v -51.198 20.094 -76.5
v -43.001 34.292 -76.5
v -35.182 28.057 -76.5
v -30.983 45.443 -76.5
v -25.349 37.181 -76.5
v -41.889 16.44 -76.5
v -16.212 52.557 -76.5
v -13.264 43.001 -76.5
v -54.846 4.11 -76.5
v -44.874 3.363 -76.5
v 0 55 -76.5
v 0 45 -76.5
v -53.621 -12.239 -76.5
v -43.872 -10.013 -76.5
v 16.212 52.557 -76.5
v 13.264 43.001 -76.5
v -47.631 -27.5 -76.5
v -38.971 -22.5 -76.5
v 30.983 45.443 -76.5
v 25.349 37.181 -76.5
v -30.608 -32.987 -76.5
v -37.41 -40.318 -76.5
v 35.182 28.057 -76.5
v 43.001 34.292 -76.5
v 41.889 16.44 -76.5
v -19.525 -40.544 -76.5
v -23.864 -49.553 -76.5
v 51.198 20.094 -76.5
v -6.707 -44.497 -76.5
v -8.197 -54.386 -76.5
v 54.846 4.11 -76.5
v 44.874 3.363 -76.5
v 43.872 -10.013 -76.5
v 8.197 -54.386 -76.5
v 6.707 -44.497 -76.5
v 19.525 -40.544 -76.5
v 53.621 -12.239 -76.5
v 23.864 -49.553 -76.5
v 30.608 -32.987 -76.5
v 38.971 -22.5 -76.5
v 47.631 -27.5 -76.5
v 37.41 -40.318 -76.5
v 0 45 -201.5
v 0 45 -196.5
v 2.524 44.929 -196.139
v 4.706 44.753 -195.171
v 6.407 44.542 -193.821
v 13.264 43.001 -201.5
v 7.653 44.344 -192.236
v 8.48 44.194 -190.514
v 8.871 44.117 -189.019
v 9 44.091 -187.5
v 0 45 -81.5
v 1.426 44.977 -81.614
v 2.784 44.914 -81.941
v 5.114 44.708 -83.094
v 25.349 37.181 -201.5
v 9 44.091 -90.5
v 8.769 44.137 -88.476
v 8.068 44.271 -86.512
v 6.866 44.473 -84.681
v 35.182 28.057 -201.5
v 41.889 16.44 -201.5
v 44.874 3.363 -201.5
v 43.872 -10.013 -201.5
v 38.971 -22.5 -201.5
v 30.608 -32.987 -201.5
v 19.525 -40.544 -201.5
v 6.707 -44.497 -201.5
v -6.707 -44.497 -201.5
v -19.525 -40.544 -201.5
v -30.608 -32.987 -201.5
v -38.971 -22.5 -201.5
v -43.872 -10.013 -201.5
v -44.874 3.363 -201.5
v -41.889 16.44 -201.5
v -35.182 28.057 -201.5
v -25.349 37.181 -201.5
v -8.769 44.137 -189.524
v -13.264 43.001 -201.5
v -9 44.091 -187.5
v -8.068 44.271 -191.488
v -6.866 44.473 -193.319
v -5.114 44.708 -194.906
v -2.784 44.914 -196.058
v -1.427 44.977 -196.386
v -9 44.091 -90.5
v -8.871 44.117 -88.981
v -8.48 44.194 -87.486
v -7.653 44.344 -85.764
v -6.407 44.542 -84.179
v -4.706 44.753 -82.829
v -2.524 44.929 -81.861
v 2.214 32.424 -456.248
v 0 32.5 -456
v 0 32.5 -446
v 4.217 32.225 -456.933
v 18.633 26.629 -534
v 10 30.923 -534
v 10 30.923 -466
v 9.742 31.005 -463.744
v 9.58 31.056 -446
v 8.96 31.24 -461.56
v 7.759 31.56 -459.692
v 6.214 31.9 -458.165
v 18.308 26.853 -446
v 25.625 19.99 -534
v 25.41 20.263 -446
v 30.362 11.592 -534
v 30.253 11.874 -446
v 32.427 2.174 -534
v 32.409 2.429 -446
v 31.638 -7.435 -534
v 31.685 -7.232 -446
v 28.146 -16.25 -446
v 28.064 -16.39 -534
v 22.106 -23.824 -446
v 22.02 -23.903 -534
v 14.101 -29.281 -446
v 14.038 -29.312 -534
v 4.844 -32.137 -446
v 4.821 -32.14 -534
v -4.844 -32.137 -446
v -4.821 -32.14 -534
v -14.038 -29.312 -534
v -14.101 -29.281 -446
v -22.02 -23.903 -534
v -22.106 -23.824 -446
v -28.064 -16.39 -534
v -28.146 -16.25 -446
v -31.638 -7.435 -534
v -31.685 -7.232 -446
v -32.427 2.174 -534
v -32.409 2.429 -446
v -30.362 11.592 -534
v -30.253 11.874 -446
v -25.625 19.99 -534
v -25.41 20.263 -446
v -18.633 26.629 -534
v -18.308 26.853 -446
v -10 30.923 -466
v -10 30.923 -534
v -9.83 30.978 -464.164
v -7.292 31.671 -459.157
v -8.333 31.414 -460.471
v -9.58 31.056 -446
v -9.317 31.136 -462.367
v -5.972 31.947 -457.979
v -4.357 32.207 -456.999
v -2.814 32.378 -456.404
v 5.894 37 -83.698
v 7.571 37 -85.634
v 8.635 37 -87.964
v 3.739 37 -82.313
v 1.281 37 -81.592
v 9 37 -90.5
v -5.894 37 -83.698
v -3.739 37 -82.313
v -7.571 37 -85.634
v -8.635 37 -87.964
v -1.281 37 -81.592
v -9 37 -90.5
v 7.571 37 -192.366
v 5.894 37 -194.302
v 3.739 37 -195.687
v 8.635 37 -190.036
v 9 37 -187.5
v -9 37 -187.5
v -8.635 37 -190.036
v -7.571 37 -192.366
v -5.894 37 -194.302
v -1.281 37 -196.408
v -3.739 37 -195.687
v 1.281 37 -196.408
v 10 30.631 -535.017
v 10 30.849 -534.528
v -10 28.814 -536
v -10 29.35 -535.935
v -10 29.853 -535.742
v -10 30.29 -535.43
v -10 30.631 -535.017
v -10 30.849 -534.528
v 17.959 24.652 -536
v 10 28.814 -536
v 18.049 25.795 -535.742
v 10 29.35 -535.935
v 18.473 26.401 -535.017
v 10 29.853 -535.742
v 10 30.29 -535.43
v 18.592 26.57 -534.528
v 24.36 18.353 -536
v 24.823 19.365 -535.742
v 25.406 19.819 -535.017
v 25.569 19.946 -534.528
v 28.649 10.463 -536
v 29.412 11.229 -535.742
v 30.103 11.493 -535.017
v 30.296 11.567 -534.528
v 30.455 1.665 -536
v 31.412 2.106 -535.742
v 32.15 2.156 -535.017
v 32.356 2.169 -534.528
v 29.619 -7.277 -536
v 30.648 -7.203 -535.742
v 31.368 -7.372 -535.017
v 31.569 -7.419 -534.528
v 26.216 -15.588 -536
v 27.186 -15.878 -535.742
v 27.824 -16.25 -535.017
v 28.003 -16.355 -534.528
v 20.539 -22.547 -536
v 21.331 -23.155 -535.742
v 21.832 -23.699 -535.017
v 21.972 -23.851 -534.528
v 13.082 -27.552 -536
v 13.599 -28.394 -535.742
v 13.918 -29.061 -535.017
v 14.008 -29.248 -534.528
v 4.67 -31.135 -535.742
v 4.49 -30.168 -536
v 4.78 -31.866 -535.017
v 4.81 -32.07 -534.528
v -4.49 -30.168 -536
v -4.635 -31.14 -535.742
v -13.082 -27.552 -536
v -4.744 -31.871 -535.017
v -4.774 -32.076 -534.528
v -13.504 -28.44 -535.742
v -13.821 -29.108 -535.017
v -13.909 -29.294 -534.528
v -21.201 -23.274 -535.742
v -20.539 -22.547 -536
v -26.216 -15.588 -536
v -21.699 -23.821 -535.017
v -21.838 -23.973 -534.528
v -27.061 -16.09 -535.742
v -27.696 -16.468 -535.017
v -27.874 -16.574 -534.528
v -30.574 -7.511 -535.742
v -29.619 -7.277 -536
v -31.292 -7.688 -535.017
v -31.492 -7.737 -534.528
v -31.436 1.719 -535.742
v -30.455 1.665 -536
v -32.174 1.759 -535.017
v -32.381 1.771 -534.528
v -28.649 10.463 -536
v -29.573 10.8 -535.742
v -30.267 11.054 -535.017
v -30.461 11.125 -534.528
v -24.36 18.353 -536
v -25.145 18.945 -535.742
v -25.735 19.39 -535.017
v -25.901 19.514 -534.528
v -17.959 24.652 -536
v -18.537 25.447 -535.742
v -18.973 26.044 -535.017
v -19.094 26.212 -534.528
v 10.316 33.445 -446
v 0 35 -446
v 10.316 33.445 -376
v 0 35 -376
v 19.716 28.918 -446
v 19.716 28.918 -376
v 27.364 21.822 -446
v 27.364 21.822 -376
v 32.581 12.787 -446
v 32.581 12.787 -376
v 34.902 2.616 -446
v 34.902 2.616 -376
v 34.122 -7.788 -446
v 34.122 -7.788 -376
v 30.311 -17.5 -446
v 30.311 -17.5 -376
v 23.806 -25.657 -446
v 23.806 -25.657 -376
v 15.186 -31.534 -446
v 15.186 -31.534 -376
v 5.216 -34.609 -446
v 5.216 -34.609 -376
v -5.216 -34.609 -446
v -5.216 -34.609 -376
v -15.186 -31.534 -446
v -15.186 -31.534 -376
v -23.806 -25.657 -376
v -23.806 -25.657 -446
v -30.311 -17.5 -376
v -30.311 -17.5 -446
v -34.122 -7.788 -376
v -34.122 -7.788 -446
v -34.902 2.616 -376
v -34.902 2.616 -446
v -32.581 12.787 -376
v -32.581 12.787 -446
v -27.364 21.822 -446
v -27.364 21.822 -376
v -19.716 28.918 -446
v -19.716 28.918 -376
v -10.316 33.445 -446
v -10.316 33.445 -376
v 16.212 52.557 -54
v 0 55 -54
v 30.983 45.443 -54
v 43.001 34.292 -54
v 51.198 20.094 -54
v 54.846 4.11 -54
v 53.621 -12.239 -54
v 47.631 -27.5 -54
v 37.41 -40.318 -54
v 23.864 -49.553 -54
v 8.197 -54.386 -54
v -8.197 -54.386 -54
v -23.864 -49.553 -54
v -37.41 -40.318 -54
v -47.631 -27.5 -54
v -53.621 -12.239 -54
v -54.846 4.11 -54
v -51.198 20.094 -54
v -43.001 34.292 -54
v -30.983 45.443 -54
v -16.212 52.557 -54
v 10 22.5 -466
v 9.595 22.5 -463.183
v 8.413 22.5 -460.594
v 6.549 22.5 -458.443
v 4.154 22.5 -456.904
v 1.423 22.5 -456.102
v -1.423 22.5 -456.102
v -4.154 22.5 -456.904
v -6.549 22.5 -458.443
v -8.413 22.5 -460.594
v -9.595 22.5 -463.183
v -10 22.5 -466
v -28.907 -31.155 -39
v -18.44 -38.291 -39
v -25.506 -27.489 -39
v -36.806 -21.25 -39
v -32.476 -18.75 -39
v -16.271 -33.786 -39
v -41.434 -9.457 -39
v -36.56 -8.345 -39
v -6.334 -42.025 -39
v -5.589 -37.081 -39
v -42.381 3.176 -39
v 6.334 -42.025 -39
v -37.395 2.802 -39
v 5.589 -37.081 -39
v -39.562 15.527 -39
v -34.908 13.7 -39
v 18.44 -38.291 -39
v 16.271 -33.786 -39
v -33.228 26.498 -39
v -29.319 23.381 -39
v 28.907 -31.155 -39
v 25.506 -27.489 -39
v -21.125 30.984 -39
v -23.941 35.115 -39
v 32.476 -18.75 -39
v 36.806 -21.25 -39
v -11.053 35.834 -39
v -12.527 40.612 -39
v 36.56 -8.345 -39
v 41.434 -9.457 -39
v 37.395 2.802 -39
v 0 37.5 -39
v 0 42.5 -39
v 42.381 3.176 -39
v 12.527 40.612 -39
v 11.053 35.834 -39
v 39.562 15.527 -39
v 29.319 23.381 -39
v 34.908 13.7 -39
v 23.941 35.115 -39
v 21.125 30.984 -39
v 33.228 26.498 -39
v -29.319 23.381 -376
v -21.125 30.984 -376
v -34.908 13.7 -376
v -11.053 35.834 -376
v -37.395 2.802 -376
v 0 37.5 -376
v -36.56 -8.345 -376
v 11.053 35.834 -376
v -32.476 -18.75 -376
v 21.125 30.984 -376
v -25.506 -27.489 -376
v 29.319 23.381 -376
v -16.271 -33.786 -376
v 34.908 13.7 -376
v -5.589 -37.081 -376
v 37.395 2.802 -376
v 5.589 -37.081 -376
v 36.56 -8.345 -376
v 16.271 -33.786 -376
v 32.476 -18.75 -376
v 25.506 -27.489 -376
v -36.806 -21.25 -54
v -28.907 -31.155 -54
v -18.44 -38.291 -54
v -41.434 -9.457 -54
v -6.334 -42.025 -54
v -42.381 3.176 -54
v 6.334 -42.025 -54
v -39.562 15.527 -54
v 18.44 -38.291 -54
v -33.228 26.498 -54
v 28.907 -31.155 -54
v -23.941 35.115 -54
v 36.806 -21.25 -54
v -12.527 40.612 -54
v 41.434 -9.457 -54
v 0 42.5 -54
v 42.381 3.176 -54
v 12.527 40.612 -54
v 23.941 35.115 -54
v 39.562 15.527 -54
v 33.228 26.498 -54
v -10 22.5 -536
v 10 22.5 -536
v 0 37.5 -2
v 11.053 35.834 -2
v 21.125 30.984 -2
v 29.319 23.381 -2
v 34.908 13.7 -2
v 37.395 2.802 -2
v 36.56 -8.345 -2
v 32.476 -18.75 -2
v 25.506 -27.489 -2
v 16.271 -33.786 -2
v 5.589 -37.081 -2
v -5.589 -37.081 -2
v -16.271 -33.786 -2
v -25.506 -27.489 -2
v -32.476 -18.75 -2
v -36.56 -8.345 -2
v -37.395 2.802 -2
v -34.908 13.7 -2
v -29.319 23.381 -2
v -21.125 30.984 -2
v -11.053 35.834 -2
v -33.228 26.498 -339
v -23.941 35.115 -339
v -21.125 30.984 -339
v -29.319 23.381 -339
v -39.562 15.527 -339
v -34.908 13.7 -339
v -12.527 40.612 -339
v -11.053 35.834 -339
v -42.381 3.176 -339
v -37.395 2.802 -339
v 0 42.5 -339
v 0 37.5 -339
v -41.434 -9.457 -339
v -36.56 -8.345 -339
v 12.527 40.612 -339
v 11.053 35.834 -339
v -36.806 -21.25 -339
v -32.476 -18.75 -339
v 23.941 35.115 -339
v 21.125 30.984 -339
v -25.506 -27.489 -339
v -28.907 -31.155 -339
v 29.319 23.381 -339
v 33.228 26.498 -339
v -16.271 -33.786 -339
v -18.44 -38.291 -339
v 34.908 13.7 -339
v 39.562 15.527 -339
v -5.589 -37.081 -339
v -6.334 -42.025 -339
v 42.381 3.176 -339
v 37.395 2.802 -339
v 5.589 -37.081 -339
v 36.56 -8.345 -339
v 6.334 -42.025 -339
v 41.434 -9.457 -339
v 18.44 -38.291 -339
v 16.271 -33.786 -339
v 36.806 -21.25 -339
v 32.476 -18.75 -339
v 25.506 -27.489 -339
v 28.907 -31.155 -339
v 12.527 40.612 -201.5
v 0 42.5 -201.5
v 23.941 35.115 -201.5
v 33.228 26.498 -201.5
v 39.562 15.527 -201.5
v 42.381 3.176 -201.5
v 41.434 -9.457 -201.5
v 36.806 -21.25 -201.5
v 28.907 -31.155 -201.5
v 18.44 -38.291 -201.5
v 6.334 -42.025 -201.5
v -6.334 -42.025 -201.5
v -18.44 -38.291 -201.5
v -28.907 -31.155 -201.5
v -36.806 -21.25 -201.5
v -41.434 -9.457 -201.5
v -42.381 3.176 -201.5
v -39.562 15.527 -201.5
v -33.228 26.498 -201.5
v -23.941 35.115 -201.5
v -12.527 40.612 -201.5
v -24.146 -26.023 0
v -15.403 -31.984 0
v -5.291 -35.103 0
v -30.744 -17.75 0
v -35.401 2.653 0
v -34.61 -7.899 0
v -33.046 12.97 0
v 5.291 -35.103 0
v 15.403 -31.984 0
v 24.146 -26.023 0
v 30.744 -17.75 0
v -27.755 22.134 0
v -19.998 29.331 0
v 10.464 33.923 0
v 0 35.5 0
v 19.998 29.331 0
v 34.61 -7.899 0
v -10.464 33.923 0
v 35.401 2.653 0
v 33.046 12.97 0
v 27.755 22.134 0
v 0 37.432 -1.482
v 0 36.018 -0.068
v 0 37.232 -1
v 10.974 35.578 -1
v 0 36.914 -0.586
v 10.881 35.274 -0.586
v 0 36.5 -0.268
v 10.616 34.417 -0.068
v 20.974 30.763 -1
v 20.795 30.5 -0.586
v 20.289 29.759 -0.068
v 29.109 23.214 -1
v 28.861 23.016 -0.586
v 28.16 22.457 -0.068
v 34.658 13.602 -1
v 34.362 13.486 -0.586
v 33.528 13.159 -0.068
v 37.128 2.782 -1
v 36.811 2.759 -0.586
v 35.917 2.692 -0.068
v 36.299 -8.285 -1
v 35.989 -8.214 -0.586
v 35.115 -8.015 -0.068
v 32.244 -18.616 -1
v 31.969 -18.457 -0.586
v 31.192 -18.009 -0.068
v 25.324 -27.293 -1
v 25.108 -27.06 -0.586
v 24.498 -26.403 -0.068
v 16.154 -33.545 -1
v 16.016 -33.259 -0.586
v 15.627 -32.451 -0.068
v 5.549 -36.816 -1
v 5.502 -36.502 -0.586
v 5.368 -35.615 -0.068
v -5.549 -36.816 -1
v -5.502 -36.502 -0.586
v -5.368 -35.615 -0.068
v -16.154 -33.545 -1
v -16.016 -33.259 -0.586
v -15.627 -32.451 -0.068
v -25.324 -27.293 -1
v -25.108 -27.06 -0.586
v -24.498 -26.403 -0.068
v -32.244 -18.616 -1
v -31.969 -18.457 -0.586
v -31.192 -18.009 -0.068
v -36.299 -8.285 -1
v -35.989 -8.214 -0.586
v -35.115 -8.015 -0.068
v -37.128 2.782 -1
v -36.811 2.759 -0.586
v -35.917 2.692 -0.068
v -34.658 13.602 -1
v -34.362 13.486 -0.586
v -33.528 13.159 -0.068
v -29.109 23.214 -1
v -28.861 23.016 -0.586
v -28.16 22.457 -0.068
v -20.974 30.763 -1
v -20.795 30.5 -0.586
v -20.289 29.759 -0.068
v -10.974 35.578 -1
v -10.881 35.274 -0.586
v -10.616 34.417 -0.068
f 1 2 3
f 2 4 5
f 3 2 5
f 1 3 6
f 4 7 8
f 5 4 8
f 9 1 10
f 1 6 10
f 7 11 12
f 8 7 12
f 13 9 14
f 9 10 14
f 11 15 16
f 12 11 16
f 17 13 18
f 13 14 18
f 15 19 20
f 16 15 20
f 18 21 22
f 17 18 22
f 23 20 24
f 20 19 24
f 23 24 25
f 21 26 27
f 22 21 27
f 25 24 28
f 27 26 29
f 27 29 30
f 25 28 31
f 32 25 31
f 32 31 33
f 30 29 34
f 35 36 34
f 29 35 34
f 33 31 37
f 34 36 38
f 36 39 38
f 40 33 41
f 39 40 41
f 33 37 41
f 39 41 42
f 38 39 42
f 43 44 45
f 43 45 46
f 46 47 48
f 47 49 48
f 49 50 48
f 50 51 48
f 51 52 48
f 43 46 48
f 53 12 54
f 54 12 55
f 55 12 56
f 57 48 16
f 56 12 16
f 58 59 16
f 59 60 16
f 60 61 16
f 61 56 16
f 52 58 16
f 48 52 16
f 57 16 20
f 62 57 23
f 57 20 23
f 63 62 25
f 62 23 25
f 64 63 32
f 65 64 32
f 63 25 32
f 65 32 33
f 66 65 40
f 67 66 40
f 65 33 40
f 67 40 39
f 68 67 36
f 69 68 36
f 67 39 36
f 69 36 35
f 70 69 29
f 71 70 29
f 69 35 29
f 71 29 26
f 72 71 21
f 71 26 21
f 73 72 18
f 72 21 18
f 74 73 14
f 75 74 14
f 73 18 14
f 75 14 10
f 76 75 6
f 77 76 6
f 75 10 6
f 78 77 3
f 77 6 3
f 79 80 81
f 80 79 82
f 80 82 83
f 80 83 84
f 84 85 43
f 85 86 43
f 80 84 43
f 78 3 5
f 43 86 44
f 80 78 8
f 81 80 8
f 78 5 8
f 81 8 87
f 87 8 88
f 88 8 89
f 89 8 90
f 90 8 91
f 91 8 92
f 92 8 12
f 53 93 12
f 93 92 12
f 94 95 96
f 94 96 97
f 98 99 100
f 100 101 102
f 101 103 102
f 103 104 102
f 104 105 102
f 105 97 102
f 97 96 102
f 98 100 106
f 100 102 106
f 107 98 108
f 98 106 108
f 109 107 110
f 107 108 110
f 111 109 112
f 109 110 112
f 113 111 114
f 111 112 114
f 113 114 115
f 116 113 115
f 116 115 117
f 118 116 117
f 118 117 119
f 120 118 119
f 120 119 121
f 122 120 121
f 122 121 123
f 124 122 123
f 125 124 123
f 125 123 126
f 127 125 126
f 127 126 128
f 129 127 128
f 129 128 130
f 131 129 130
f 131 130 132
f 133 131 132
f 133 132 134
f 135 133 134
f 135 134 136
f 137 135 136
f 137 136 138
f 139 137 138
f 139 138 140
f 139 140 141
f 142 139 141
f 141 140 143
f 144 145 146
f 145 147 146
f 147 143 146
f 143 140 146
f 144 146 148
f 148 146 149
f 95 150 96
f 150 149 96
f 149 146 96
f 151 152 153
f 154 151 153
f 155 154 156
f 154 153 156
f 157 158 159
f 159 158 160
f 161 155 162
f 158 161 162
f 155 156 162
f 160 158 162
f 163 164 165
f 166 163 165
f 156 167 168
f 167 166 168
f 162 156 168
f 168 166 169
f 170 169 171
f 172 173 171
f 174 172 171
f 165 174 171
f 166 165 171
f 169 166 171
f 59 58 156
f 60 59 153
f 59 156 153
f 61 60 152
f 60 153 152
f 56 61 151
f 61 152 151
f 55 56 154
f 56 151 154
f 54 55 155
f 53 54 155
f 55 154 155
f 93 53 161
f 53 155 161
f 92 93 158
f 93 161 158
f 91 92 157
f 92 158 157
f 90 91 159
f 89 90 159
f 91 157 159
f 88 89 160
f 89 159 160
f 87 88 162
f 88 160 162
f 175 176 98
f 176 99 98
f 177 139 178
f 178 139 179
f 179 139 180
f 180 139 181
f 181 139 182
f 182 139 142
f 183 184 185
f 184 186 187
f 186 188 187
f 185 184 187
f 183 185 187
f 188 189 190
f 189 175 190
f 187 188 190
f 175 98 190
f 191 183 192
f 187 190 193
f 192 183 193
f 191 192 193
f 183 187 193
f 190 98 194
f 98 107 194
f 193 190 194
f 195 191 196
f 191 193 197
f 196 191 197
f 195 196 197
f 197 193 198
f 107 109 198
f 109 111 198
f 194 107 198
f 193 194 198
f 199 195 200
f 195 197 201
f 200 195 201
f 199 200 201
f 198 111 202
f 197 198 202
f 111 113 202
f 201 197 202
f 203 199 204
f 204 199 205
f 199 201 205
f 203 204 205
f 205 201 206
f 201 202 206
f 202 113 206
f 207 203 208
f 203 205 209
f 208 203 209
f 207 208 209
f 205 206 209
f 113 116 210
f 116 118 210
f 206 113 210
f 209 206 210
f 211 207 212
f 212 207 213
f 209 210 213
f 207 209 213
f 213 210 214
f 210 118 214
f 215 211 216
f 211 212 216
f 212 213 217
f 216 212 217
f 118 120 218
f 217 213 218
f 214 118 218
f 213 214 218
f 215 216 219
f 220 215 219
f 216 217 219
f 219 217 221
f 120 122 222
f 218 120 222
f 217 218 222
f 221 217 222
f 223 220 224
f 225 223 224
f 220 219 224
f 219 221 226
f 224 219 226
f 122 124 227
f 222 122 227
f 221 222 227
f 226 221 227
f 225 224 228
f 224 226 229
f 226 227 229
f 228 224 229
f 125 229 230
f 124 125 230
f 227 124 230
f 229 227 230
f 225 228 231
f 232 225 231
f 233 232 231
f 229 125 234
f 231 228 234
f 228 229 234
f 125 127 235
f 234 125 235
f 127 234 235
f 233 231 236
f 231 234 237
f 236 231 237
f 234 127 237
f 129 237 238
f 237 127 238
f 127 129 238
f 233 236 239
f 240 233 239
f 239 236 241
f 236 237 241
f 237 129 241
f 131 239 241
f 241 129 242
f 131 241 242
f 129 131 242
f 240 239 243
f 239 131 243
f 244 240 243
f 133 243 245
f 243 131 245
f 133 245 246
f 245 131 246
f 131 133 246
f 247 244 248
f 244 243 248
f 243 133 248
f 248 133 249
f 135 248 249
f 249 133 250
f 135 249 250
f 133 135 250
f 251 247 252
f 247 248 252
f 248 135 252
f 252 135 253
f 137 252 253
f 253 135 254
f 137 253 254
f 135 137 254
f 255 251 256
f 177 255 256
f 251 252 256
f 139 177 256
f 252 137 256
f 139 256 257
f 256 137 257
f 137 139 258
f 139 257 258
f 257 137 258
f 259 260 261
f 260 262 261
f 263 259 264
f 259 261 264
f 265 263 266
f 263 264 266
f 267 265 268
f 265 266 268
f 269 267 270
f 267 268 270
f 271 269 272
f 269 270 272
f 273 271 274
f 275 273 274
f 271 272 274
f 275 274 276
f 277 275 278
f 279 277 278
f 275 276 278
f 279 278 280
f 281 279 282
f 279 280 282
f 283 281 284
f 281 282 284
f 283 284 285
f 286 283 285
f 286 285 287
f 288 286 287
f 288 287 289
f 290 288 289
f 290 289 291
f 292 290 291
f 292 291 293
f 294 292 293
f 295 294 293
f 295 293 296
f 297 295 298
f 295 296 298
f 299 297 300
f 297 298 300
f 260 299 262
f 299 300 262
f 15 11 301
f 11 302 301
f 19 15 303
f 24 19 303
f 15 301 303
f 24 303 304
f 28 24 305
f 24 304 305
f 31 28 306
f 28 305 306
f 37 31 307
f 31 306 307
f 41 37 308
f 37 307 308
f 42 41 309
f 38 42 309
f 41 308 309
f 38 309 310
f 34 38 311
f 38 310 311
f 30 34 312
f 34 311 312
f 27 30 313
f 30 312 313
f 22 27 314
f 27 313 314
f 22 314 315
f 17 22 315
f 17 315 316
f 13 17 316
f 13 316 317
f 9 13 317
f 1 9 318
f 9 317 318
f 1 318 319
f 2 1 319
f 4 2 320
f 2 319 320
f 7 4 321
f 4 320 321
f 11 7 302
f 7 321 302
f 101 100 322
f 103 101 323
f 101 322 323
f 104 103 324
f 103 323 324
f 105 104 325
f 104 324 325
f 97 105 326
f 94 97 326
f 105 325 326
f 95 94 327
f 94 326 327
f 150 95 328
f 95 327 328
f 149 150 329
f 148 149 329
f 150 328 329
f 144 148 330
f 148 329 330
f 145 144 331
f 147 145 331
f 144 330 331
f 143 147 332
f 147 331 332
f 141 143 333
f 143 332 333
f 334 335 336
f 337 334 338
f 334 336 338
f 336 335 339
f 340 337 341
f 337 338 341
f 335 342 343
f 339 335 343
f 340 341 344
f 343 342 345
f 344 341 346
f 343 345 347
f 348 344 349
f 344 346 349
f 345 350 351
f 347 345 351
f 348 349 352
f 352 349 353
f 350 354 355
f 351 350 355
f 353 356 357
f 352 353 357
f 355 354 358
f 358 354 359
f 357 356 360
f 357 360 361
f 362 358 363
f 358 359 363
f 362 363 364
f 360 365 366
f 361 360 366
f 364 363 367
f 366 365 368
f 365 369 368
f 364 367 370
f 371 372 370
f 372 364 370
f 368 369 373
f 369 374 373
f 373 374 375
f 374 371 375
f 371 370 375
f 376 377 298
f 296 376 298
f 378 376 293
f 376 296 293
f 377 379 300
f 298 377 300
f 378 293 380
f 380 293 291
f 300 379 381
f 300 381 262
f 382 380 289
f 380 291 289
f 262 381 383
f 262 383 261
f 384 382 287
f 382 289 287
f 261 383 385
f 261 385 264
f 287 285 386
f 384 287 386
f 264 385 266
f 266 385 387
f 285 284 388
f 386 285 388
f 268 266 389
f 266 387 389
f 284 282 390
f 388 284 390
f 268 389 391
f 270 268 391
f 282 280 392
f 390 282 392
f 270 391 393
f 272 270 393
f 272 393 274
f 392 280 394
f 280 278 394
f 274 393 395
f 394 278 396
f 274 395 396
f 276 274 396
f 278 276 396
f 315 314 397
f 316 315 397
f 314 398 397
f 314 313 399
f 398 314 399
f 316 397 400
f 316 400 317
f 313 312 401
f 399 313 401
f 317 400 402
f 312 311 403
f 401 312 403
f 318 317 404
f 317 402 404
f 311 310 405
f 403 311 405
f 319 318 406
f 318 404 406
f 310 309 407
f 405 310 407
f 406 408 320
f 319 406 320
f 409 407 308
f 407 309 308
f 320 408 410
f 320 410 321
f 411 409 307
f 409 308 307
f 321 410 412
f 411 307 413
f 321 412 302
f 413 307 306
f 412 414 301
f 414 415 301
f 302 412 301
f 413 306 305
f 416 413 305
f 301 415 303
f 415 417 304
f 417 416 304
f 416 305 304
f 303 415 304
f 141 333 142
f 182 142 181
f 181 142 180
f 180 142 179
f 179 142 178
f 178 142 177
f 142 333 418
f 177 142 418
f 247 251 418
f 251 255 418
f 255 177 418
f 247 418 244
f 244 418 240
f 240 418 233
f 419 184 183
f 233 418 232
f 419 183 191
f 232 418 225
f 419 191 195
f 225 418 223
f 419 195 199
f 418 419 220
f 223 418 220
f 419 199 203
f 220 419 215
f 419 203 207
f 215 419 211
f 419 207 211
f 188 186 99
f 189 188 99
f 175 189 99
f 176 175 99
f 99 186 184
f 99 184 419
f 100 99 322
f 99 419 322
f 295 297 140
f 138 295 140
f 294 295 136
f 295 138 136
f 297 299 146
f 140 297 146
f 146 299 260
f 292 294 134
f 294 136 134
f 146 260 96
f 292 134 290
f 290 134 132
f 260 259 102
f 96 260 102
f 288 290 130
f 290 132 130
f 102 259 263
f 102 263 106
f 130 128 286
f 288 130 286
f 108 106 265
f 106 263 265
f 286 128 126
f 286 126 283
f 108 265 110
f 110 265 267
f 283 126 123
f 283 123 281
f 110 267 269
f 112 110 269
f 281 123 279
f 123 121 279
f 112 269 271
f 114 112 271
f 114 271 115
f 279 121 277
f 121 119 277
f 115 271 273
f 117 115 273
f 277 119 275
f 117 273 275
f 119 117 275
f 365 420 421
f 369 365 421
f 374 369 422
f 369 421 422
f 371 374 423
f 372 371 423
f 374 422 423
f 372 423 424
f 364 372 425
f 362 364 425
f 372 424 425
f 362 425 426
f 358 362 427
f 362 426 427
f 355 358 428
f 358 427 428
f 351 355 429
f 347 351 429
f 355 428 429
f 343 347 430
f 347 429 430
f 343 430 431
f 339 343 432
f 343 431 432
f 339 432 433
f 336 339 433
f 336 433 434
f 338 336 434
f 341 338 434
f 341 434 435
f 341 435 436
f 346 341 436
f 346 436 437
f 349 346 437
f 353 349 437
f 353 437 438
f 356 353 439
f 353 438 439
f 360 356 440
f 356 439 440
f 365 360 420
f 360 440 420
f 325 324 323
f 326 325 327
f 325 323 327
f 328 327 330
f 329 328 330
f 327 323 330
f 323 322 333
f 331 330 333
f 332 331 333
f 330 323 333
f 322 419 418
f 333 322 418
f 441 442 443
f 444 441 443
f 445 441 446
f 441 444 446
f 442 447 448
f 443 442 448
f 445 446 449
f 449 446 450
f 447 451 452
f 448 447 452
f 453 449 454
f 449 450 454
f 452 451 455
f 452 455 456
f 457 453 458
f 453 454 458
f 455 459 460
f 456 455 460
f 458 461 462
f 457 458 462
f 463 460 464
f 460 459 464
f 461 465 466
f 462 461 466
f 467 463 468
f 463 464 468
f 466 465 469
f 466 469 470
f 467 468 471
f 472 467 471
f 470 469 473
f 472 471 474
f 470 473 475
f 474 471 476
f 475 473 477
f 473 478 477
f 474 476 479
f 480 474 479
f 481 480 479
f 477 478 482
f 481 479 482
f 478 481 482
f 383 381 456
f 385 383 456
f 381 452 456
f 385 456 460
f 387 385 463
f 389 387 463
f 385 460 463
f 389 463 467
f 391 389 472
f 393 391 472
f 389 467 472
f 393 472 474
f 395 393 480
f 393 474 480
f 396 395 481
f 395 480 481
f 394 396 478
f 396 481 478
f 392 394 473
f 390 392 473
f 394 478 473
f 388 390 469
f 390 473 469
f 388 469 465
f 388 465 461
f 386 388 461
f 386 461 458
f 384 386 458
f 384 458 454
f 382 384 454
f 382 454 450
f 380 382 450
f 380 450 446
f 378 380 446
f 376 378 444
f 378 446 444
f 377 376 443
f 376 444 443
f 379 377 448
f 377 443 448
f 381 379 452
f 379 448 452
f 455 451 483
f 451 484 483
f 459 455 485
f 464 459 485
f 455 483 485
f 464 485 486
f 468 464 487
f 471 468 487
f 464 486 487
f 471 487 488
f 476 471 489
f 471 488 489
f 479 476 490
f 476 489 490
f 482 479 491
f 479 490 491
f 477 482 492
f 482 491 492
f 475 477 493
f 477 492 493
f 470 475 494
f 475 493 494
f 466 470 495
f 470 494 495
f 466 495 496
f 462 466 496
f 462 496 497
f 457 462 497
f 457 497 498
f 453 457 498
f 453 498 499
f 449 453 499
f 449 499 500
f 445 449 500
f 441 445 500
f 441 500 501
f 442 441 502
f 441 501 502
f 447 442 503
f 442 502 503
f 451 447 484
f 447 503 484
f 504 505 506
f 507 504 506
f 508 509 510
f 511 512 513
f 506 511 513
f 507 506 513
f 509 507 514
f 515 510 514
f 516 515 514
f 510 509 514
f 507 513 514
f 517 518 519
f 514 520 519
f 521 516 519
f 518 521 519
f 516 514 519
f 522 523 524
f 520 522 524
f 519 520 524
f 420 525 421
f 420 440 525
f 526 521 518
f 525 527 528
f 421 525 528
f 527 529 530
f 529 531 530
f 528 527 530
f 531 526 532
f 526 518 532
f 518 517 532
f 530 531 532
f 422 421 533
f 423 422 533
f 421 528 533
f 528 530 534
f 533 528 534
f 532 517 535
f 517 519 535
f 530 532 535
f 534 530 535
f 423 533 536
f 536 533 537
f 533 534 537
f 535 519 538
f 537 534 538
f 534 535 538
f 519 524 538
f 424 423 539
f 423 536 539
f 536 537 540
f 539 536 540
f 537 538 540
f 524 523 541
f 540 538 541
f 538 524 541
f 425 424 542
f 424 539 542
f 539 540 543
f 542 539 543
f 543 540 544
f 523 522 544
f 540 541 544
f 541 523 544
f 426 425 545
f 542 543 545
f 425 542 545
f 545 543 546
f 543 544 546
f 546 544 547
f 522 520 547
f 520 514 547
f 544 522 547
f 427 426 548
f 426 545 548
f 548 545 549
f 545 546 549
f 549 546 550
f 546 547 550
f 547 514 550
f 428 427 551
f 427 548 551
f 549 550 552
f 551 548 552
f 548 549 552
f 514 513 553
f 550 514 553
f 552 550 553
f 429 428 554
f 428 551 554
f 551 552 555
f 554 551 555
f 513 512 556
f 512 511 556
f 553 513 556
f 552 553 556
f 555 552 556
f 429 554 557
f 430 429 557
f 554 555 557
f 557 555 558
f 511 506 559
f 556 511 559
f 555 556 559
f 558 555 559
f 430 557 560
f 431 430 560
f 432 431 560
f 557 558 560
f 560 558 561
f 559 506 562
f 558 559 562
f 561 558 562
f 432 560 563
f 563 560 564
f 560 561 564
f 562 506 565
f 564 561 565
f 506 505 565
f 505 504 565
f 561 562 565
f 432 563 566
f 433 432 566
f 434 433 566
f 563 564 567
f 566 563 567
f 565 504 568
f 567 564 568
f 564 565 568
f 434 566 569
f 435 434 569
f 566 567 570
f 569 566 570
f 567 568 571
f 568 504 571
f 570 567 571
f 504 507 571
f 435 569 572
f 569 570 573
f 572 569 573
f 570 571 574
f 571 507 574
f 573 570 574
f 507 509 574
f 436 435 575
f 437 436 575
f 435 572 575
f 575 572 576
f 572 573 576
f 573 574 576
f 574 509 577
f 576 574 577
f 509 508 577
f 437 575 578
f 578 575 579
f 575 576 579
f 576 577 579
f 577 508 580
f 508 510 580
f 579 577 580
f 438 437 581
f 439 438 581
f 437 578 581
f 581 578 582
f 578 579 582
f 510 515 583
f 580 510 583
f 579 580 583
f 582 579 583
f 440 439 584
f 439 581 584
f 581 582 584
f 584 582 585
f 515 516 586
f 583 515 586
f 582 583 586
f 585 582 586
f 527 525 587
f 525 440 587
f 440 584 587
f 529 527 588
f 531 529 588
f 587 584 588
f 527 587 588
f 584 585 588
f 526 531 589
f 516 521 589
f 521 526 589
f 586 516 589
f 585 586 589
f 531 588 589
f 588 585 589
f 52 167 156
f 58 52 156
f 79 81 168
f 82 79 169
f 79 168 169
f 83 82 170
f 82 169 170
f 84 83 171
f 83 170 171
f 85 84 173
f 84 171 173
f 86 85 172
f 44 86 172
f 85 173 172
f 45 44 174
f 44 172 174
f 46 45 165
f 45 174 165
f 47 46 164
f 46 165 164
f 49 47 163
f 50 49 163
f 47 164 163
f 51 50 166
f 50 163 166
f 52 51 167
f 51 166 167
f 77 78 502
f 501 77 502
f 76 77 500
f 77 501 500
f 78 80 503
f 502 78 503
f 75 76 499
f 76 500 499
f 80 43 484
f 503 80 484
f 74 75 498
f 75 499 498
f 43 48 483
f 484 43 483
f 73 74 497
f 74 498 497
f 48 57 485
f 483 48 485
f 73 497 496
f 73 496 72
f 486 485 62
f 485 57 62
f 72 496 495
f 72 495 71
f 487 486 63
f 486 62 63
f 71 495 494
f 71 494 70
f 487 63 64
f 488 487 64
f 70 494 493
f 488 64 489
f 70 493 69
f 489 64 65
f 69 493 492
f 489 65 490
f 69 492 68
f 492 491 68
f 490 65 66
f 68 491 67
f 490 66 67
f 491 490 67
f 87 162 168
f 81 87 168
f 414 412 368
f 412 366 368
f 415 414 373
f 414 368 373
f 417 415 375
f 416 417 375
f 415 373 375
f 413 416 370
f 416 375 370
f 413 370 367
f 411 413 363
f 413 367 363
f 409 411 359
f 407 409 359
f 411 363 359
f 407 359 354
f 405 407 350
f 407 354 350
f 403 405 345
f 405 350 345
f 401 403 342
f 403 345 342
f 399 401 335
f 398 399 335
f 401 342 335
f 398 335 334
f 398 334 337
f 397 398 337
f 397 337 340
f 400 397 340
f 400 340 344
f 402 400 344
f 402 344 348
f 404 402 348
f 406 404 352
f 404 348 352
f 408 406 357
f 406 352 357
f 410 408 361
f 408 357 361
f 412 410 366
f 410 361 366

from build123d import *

# Parameters (mm, degrees)
FILLET1_R          = 2
CUT_EXTRUDE1_START = 37
CUT_EXTRUDE1_DEPTH = 10
CUT_EXTRUDE2_START = 22.5
CUT_EXTRUDE2_DEPTH = 10


with BuildPart() as part:
    # Sketch1 → Revolve1 (revolve)
    with BuildSketch(Plane(origin=(0, 0, 0), x_dir=(0, 0, -1), z_dir=(1, 0, 0))):
        Polygon((0, 0), (536, 0), (536, 32.5), (446, 32.5), (446, 35), (376, 35), (376, 37.5), (339, 37.5), (339, 42.5), (201.5, 42.5), (201.5, 45), (76.5, 45), (76.5, 55), (54, 55), (54, 42.5), (39, 42.5), (39, 37.5), (0, 37.5), align=None)
    revolve(axis=Axis((0, 0, 0), (0, 0, -1)))

    # Fillet1
    fillet1_edges = [part.edges().sort_by_distance(p)[0] for p in [
        (0, -37.5, 0),
        (0, -32.5, -536),
    ]]
    fillet(fillet1_edges, radius=FILLET1_R)

    # Sketch2 → Cut-Extrude1 (cut)
    with BuildSketch(Plane(origin=(0, 0, 0), x_dir=(1, 0, 0), z_dir=(0, 1, 0)).offset(CUT_EXTRUDE1_START)):
        with BuildLine():
            Line((9, 187.5), (9, 90.5))
            ThreePointArc((9, 90.5), (0, 81.5), (-9, 90.5))
            Line((-9, 90.5), (-9, 187.5))
            ThreePointArc((-9, 187.5), (0, 196.5), (9, 187.5))
        make_face()
    extrude(amount=CUT_EXTRUDE1_DEPTH, mode=Mode.SUBTRACT)

    # Sketch3 → Cut-Extrude2 (cut)
    with BuildSketch(Plane(origin=(0, 0, 0), x_dir=(1, 0, 0), z_dir=(0, 1, 0)).offset(CUT_EXTRUDE2_START)):
        with BuildLine():
            Line((10, 536), (10, 466))
            ThreePointArc((10, 466), (0, 456), (-10, 466))
            Line((-10, 466), (-10, 536))
            ThreePointArc((-10, 536), (0, 546), (10, 536))
        make_face()
    extrude(amount=CUT_EXTRUDE2_DEPTH, mode=Mode.SUBTRACT)


solid = part.part
